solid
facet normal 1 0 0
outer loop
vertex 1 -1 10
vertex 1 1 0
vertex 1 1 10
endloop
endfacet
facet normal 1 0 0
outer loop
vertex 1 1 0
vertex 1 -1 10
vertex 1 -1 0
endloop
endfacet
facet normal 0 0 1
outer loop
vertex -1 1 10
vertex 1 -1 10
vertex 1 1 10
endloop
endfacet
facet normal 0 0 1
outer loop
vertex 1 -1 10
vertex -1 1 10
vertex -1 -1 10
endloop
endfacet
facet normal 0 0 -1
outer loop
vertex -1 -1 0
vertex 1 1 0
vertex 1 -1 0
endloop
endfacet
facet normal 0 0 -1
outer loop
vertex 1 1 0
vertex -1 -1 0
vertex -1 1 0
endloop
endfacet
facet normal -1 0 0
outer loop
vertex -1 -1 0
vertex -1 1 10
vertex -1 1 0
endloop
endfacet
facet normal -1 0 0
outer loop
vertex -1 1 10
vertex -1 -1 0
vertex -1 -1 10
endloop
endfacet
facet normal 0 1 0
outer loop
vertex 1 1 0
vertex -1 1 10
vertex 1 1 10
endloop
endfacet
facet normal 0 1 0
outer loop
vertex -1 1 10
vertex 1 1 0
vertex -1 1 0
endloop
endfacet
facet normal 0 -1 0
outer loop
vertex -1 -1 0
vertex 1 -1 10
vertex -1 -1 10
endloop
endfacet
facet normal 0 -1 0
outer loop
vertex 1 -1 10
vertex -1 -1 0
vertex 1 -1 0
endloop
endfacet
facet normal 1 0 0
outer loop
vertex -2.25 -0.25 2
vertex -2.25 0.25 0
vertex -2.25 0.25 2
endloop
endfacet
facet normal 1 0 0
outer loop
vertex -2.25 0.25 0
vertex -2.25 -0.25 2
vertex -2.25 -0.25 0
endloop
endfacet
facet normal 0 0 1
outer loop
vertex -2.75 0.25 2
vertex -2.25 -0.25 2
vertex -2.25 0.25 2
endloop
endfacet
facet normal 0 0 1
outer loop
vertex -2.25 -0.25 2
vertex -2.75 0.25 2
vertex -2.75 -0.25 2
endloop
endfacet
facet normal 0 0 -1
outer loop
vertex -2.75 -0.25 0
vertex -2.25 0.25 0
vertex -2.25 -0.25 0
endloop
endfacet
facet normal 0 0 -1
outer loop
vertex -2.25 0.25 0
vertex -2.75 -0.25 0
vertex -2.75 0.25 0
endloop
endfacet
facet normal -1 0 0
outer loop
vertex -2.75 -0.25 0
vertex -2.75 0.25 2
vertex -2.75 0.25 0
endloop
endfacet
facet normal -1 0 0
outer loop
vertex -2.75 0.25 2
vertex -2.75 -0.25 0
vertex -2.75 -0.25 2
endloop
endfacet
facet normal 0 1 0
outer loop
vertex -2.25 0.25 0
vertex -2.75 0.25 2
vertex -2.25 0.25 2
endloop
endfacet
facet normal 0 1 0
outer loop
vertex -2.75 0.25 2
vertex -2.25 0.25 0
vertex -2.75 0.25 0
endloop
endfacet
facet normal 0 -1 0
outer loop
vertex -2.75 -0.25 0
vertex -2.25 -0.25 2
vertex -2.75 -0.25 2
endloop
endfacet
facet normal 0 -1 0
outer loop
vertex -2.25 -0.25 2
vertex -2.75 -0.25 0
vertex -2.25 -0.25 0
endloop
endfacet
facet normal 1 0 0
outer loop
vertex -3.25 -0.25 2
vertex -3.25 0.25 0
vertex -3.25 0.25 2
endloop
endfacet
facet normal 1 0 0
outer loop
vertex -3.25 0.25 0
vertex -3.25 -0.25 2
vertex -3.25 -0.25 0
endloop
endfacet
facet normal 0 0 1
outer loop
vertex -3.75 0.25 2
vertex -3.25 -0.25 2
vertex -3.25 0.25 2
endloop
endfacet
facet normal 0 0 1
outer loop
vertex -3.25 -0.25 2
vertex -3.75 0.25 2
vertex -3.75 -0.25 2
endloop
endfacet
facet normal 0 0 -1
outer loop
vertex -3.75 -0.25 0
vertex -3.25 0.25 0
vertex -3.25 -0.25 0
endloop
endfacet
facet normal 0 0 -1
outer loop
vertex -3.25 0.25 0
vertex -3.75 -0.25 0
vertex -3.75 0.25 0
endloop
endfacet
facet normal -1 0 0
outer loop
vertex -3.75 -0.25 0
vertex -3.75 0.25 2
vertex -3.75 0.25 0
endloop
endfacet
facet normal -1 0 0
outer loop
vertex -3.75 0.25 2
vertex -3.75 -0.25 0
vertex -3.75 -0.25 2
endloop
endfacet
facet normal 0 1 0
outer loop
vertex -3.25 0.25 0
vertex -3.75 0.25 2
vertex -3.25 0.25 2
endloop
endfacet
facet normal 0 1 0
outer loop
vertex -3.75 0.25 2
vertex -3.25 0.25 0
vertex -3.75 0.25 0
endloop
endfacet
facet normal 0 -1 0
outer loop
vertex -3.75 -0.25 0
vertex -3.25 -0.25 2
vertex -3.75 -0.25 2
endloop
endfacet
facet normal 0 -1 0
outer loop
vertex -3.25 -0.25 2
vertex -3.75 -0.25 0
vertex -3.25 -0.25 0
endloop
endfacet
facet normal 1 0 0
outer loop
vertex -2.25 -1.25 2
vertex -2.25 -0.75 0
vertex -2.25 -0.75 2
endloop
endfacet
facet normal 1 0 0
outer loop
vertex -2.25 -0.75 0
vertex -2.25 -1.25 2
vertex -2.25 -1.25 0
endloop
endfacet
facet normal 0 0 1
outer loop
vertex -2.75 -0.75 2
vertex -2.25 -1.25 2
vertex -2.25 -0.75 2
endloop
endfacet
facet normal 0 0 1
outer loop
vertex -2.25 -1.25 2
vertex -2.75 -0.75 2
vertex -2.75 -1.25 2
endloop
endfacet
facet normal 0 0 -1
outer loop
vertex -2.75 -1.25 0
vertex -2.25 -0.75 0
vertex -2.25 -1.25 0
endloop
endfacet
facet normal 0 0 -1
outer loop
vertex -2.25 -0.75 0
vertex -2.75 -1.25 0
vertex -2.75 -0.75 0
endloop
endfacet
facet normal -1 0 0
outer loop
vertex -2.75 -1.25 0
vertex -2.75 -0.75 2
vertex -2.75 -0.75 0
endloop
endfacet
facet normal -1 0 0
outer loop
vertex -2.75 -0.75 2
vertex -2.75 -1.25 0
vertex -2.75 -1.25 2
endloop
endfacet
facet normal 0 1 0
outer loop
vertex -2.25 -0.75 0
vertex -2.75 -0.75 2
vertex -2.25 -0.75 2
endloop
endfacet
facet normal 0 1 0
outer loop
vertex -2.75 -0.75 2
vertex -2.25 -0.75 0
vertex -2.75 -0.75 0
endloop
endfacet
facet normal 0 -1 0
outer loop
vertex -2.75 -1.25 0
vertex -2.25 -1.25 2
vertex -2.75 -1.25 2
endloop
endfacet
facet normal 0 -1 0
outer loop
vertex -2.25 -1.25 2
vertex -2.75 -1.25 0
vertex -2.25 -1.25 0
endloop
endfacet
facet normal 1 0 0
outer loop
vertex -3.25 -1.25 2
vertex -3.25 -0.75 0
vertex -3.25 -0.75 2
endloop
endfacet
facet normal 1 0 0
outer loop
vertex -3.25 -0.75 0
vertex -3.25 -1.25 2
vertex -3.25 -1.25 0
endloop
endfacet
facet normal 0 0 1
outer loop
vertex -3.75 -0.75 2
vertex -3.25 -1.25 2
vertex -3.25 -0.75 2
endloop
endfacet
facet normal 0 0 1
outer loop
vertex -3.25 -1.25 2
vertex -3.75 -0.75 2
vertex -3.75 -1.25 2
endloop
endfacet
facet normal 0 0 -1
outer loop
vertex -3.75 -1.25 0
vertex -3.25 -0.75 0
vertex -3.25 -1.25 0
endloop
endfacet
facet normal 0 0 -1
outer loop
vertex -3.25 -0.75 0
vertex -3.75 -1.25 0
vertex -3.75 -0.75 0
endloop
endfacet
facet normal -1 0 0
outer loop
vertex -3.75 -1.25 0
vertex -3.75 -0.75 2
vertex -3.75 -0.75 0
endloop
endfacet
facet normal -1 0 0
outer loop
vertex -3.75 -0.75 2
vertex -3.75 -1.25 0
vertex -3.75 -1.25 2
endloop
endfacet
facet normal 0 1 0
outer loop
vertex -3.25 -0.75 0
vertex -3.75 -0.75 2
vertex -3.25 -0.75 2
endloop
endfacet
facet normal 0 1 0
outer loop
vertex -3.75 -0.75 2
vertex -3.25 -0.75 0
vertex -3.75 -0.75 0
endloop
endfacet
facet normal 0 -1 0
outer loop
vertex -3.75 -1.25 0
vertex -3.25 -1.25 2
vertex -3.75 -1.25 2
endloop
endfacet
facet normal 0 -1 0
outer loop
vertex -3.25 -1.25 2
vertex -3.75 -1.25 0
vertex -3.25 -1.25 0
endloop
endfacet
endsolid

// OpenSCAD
translate([0, 0, 5]) color([0,1,0,0.9]) cube([2, 2, 10], center=true);
translate([-2.5, 0, 1]) color([1,0,0]) cube([0.5, 0.5, 2], center=true);
translate([-3.5, 0, 1]) color([1,0,0]) cube([0.5, 0.5, 2], center=true);
translate([-2.5, -1, 1]) color([1,0,0]) cube([0.5, 0.5, 2], center=true);
translate([-3.5, -1, 1]) color([1,0,0]) cube([0.5, 0.5, 2], center=true);
